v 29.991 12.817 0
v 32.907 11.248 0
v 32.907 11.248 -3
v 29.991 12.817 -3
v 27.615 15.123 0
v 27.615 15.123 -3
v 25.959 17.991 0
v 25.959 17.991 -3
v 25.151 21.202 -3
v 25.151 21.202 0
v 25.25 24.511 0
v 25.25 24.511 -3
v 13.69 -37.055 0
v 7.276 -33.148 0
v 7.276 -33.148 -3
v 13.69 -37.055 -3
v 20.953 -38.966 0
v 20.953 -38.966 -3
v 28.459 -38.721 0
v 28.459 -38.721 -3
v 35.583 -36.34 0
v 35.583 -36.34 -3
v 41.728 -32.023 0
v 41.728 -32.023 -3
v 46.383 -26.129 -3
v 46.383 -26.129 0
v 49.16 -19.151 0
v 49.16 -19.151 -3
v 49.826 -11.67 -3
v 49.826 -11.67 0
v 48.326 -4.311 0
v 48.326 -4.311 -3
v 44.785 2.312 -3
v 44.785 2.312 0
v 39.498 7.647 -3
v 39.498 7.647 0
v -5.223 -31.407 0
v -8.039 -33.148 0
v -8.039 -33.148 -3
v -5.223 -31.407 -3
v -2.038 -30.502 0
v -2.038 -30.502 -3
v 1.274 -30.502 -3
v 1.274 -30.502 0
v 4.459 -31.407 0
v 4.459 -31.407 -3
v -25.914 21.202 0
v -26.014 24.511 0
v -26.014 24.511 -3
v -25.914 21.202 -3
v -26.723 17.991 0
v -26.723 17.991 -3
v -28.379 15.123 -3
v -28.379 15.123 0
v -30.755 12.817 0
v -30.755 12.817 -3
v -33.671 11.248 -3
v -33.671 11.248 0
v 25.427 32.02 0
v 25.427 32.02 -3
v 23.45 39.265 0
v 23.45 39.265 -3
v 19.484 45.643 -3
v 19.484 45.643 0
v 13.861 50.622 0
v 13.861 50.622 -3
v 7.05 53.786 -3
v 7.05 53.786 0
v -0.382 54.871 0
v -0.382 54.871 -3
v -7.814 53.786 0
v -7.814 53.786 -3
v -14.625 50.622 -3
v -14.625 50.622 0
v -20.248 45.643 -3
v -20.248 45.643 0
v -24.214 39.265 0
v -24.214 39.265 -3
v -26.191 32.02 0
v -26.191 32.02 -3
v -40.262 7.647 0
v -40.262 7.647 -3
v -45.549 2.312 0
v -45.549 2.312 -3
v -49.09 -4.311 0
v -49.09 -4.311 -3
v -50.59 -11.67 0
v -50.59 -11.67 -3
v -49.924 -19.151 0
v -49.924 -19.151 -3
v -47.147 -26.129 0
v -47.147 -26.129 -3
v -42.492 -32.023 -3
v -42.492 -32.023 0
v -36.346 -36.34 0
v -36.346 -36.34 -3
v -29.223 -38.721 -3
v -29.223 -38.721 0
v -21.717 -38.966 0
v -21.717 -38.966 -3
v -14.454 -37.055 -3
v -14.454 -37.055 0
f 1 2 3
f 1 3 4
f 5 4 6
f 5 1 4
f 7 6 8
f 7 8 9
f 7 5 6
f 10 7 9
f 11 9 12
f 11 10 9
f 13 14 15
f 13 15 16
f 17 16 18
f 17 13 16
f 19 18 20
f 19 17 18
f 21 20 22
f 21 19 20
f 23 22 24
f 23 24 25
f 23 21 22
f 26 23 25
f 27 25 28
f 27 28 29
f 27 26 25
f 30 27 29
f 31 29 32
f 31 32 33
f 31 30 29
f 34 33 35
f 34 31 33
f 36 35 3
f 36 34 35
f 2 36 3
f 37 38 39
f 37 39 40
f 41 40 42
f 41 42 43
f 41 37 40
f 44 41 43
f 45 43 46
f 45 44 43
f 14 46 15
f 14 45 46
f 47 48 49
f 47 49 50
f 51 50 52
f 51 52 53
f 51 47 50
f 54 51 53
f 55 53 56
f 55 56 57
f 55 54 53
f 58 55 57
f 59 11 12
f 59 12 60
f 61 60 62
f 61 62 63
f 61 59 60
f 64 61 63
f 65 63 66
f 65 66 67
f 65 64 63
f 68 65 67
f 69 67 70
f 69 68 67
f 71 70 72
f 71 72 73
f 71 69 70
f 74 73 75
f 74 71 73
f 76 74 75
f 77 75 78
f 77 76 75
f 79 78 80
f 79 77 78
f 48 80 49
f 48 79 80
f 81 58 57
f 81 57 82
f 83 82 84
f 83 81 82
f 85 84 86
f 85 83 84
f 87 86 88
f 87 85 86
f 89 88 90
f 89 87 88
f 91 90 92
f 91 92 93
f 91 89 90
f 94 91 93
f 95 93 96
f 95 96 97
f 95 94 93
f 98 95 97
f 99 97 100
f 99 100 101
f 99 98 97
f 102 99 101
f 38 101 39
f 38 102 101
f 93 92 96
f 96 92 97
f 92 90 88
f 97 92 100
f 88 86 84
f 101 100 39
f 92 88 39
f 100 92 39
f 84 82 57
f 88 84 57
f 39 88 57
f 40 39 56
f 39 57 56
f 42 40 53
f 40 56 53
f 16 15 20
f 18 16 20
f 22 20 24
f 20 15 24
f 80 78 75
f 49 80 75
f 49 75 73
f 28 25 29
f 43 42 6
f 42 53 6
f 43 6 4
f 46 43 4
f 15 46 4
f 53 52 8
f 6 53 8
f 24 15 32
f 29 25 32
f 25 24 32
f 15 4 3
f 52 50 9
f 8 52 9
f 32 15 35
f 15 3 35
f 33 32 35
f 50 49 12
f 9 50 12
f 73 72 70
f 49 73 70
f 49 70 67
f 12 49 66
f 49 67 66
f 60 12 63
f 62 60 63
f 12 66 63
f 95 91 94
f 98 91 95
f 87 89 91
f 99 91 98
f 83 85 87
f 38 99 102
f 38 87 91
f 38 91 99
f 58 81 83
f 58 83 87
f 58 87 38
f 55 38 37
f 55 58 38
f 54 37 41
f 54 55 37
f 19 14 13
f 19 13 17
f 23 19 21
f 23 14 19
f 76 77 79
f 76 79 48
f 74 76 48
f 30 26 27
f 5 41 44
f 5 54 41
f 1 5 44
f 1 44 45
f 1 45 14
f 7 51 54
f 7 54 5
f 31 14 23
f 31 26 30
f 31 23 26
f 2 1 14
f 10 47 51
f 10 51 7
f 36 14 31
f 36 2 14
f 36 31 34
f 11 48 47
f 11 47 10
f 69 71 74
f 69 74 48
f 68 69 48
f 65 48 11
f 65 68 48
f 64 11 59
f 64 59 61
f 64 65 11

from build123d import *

# Parameters (mm, degrees)
F1_DEPTH = 3


# Not quite as in the source:
# - ends of sketch curves that miss each other by under 0.0002 mm in the source are joined


with BuildPart() as f1:
    # F0 (on Top) → F1 (new body)
    with BuildSketch(Plane.XY):
        with BuildLine():
            ThreePointArc((32.9074971055, 11.248177677), (26.6878329895, 16.4993586176), (25.2500089531, 24.5113362153))
            ThreePointArc((25.2500089531, 24.5113362153), (-0.3819362324, 54.8706200704), (-26.0138819919, 24.5113361177))
            ThreePointArc((-26.0138819919, 24.5113361177), (-27.4517054543, 16.4993586176), (-33.6713695703, 11.248177677))
            ThreePointArc((-33.6713695703, 11.248177677), (-47.1473080368, -26.1293799296), (-8.0394240132, -33.1476541294))
            ThreePointArc((-8.0394240132, -33.1476541294), (-0.3819362324, -30.3868579581), (7.2755513239, -33.1476544003))
            ThreePointArc((7.2755513239, -33.1476544003), (46.383435572, -26.1293799296), (32.9074971055, 11.248177677))
        make_face()
    extrude(amount=-F1_DEPTH)


solid = f1.part
